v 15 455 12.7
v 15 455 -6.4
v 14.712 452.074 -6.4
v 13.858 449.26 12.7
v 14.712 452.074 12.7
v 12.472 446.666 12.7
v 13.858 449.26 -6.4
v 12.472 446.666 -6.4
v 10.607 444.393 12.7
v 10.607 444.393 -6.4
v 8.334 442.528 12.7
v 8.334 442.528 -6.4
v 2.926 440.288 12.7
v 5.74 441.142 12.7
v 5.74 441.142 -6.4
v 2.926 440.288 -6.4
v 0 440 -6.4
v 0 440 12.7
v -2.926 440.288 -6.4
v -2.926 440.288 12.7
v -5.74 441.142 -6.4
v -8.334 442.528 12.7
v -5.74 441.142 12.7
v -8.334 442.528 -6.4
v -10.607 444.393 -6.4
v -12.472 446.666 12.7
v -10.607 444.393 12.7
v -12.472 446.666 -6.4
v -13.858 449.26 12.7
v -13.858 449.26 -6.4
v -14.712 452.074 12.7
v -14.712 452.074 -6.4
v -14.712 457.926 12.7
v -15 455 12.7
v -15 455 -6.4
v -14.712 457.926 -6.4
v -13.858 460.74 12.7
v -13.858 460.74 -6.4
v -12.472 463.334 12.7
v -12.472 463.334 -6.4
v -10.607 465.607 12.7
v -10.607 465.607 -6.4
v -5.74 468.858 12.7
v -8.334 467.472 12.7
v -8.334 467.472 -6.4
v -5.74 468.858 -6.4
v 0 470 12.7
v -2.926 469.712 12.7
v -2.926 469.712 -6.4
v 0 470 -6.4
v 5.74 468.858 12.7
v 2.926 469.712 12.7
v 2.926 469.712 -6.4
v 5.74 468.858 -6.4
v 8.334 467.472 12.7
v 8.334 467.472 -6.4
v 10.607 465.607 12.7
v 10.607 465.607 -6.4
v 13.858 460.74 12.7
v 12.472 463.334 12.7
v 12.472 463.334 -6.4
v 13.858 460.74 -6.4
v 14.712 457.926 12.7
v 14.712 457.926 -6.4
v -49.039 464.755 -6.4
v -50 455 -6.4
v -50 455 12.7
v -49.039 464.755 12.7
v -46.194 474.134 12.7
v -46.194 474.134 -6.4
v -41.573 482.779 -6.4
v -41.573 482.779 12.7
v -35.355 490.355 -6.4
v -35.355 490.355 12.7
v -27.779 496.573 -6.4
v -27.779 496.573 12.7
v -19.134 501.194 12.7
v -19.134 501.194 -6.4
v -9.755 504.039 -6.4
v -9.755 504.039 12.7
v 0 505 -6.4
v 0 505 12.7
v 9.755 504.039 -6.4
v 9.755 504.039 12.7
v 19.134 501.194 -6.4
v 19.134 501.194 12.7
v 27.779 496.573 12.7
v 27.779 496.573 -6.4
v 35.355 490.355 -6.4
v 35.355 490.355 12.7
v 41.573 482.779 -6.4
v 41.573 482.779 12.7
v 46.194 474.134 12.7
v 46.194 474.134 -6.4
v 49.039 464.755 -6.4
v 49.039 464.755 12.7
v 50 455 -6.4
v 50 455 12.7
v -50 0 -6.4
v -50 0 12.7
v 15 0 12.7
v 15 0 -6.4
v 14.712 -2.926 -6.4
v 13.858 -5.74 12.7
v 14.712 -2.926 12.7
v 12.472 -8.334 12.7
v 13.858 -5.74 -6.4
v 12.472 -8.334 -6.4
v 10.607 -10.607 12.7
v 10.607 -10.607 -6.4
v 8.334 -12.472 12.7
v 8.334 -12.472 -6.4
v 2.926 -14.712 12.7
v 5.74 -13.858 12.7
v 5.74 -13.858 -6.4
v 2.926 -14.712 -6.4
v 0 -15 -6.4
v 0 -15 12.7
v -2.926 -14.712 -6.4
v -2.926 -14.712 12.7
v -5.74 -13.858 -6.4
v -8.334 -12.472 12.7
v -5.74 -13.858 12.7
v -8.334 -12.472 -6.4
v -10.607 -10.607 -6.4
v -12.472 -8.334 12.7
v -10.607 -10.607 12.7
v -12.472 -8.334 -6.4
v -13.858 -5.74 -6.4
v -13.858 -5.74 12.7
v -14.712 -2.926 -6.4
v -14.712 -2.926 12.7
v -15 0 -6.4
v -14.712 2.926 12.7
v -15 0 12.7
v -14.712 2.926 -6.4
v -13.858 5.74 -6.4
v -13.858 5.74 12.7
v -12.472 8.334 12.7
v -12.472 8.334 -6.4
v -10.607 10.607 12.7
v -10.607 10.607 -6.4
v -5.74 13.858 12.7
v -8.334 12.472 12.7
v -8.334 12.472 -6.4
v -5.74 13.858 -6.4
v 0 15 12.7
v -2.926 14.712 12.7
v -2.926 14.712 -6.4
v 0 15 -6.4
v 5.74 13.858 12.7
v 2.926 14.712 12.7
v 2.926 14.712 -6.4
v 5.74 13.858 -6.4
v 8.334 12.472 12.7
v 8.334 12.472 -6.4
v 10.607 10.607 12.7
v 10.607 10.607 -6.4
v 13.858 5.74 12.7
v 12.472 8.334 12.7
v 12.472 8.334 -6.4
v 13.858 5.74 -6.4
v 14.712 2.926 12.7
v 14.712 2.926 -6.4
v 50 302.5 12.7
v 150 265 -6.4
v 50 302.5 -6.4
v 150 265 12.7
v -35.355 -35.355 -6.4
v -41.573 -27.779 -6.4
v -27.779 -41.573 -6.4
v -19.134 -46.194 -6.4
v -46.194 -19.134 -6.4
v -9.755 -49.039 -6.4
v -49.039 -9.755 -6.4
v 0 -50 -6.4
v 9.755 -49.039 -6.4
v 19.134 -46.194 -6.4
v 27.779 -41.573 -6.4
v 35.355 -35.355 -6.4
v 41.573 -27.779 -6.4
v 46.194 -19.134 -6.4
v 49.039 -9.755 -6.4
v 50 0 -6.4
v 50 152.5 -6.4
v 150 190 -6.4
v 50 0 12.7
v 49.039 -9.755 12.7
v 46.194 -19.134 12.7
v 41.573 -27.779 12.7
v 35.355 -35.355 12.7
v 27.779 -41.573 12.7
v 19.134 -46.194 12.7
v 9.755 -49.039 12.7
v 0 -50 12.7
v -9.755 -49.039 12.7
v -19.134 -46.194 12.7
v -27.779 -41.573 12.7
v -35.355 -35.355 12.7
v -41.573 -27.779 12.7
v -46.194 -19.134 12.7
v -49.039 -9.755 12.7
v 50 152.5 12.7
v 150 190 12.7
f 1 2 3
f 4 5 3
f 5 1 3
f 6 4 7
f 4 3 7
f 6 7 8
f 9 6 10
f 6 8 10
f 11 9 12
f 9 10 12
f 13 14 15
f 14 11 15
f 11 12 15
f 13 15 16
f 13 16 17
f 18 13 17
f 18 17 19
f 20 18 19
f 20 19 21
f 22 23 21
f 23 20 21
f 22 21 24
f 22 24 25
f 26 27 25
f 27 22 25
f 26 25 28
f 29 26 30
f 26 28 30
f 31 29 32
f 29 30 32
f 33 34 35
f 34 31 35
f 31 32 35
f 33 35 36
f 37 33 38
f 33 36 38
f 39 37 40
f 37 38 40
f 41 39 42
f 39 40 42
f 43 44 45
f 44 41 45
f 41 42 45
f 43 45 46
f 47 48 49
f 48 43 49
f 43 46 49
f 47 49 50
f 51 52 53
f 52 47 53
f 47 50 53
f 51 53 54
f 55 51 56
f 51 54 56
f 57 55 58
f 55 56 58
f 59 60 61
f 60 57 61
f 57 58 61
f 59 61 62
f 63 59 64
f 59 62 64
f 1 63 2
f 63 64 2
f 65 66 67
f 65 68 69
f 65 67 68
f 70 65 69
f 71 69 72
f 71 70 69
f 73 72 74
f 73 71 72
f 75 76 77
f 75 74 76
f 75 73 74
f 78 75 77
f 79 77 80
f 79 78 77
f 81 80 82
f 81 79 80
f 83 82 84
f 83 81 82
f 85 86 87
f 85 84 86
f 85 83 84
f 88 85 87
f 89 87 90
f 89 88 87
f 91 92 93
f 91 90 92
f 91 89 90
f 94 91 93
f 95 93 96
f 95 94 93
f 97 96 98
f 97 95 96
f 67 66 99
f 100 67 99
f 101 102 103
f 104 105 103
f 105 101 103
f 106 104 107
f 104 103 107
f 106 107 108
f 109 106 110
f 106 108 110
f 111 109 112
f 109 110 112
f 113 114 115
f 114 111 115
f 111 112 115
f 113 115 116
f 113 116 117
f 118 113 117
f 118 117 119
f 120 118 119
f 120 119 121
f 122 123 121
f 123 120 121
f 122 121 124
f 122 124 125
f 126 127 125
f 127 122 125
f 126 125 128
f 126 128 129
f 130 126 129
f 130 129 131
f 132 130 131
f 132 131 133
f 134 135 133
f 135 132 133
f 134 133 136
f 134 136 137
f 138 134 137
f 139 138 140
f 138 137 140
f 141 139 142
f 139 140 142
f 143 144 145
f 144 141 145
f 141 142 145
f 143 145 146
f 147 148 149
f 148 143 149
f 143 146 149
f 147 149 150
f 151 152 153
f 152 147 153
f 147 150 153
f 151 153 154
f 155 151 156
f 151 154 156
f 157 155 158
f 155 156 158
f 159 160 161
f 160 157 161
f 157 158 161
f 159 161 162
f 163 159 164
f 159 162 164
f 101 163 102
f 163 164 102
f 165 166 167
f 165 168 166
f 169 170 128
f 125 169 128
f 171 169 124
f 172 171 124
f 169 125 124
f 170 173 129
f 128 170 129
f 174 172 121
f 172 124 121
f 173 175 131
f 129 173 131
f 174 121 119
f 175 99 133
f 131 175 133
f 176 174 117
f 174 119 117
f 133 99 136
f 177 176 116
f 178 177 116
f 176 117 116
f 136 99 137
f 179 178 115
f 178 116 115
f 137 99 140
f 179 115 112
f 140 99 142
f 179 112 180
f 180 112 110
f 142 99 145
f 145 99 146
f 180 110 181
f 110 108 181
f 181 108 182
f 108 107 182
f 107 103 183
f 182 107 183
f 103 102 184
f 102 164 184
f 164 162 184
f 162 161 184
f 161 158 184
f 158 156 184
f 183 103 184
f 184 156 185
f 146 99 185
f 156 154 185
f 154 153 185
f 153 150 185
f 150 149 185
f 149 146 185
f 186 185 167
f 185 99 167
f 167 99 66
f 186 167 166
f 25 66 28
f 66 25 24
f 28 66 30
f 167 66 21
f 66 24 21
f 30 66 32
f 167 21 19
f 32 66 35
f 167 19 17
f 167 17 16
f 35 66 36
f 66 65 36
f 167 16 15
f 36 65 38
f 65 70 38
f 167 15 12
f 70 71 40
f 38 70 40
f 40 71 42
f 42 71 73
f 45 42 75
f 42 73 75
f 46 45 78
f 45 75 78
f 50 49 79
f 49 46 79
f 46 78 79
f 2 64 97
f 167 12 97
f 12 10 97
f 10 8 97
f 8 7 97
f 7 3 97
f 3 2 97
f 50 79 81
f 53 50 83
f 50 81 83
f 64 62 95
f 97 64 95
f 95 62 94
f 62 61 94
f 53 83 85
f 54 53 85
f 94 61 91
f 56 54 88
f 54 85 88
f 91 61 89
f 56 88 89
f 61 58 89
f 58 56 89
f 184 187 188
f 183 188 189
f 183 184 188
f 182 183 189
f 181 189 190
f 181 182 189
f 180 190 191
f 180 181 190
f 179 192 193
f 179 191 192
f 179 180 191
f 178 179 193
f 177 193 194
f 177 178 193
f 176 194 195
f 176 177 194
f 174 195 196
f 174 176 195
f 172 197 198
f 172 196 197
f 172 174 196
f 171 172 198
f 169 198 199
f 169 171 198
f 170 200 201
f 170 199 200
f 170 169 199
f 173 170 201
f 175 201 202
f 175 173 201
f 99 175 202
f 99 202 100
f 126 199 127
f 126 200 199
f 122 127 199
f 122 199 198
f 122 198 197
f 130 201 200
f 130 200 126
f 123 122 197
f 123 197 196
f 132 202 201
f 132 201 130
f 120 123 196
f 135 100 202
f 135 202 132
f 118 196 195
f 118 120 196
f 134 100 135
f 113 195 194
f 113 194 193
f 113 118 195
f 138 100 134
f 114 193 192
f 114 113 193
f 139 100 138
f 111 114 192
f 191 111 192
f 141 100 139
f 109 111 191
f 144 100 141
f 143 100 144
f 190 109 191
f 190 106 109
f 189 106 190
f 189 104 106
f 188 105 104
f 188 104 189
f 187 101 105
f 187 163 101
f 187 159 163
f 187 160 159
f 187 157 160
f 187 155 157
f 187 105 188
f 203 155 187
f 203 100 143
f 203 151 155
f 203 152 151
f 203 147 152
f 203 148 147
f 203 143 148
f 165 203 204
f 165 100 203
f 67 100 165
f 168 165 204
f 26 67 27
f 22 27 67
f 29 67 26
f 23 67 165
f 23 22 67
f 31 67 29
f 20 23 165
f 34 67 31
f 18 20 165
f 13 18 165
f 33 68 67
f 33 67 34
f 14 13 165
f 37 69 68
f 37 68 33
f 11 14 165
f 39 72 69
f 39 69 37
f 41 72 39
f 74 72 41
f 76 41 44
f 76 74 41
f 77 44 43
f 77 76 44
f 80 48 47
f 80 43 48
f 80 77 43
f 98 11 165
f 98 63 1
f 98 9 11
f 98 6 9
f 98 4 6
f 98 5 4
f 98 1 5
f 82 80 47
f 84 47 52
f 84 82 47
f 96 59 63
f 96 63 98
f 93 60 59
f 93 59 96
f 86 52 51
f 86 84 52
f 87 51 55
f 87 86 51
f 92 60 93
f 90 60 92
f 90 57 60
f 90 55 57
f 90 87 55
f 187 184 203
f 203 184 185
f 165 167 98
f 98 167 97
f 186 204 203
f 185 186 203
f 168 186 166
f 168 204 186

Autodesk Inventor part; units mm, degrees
ref_plane "YZ Plane" through (0, 0, 0) normal (1, 0, 0) x (0, 1, 0)
ref_plane "XZ Plane" through (0, 0, 0) normal (0, 1, 0) x (-1, 0, 0)
ref_plane "XY Plane" through (0, 0, 0) normal (0, 0, 1) x (1, 0, 0)
sketch "Sketch1" plane through (0, 0, 0) normal (0, 0, 1) x (1, 0, 0)
  line L0 (0, 0) -> (0, 455) construction
  line L1 (50, 0) -> (50, 455)
  line L2 (-50, 455) -> (-50, 0)
  arc A0 (-50, 0) -> (50, 0) centre (0, 0) ccw
  arc A1 (50, 455) -> (-50, 455) centre (0, 455) ccw
  circle A2 centre (0, 455) radius 15
  circle A3 centre (0, 0) radius 15
  point P0 (0, 227.5)
  point P1 (0, 505)
  point P2 (0, -50)
  dimension "d0" = 455
  dimension "d2" = 30
  dimension "d3" = 30
  dimension "d6" = 555
extrude "Extrusion1" add sketch "Sketch1" along normal blind 12.7 and the other way blind 6.4
sketch "Sketch3" plane through (0, 0, 12.7) normal (0, 0, 1) x (1, 0, 0)
  line L0 (50, 0) -> (50, 455) projected
  line L1 (150, 227.5) -> (150, 265)
  line L2 (150, 265) -> (50, 302.5)
  line L3 (150, 227.5) -> (150, 190)
  line L4 (150, 190) -> (50, 152.5)
  point P0 (0, 0)
  point P1 (50, 227.5)
  dimension "d9" = 150
  dimension "d10" = 75
  dimension "d11" = 152.5
  dimension "d12" = 100
extrude "Extrusion2" add sketch "Sketch3" against normal blind 19.1
sketch "Sketch4" plane through (0, 0, -6.4) normal (0, 0, -1) x (-1, 0, 0)
  point P0 (0, 0)
properties part number "Eslabon de arrastre externo" material "Steel, Mild"
